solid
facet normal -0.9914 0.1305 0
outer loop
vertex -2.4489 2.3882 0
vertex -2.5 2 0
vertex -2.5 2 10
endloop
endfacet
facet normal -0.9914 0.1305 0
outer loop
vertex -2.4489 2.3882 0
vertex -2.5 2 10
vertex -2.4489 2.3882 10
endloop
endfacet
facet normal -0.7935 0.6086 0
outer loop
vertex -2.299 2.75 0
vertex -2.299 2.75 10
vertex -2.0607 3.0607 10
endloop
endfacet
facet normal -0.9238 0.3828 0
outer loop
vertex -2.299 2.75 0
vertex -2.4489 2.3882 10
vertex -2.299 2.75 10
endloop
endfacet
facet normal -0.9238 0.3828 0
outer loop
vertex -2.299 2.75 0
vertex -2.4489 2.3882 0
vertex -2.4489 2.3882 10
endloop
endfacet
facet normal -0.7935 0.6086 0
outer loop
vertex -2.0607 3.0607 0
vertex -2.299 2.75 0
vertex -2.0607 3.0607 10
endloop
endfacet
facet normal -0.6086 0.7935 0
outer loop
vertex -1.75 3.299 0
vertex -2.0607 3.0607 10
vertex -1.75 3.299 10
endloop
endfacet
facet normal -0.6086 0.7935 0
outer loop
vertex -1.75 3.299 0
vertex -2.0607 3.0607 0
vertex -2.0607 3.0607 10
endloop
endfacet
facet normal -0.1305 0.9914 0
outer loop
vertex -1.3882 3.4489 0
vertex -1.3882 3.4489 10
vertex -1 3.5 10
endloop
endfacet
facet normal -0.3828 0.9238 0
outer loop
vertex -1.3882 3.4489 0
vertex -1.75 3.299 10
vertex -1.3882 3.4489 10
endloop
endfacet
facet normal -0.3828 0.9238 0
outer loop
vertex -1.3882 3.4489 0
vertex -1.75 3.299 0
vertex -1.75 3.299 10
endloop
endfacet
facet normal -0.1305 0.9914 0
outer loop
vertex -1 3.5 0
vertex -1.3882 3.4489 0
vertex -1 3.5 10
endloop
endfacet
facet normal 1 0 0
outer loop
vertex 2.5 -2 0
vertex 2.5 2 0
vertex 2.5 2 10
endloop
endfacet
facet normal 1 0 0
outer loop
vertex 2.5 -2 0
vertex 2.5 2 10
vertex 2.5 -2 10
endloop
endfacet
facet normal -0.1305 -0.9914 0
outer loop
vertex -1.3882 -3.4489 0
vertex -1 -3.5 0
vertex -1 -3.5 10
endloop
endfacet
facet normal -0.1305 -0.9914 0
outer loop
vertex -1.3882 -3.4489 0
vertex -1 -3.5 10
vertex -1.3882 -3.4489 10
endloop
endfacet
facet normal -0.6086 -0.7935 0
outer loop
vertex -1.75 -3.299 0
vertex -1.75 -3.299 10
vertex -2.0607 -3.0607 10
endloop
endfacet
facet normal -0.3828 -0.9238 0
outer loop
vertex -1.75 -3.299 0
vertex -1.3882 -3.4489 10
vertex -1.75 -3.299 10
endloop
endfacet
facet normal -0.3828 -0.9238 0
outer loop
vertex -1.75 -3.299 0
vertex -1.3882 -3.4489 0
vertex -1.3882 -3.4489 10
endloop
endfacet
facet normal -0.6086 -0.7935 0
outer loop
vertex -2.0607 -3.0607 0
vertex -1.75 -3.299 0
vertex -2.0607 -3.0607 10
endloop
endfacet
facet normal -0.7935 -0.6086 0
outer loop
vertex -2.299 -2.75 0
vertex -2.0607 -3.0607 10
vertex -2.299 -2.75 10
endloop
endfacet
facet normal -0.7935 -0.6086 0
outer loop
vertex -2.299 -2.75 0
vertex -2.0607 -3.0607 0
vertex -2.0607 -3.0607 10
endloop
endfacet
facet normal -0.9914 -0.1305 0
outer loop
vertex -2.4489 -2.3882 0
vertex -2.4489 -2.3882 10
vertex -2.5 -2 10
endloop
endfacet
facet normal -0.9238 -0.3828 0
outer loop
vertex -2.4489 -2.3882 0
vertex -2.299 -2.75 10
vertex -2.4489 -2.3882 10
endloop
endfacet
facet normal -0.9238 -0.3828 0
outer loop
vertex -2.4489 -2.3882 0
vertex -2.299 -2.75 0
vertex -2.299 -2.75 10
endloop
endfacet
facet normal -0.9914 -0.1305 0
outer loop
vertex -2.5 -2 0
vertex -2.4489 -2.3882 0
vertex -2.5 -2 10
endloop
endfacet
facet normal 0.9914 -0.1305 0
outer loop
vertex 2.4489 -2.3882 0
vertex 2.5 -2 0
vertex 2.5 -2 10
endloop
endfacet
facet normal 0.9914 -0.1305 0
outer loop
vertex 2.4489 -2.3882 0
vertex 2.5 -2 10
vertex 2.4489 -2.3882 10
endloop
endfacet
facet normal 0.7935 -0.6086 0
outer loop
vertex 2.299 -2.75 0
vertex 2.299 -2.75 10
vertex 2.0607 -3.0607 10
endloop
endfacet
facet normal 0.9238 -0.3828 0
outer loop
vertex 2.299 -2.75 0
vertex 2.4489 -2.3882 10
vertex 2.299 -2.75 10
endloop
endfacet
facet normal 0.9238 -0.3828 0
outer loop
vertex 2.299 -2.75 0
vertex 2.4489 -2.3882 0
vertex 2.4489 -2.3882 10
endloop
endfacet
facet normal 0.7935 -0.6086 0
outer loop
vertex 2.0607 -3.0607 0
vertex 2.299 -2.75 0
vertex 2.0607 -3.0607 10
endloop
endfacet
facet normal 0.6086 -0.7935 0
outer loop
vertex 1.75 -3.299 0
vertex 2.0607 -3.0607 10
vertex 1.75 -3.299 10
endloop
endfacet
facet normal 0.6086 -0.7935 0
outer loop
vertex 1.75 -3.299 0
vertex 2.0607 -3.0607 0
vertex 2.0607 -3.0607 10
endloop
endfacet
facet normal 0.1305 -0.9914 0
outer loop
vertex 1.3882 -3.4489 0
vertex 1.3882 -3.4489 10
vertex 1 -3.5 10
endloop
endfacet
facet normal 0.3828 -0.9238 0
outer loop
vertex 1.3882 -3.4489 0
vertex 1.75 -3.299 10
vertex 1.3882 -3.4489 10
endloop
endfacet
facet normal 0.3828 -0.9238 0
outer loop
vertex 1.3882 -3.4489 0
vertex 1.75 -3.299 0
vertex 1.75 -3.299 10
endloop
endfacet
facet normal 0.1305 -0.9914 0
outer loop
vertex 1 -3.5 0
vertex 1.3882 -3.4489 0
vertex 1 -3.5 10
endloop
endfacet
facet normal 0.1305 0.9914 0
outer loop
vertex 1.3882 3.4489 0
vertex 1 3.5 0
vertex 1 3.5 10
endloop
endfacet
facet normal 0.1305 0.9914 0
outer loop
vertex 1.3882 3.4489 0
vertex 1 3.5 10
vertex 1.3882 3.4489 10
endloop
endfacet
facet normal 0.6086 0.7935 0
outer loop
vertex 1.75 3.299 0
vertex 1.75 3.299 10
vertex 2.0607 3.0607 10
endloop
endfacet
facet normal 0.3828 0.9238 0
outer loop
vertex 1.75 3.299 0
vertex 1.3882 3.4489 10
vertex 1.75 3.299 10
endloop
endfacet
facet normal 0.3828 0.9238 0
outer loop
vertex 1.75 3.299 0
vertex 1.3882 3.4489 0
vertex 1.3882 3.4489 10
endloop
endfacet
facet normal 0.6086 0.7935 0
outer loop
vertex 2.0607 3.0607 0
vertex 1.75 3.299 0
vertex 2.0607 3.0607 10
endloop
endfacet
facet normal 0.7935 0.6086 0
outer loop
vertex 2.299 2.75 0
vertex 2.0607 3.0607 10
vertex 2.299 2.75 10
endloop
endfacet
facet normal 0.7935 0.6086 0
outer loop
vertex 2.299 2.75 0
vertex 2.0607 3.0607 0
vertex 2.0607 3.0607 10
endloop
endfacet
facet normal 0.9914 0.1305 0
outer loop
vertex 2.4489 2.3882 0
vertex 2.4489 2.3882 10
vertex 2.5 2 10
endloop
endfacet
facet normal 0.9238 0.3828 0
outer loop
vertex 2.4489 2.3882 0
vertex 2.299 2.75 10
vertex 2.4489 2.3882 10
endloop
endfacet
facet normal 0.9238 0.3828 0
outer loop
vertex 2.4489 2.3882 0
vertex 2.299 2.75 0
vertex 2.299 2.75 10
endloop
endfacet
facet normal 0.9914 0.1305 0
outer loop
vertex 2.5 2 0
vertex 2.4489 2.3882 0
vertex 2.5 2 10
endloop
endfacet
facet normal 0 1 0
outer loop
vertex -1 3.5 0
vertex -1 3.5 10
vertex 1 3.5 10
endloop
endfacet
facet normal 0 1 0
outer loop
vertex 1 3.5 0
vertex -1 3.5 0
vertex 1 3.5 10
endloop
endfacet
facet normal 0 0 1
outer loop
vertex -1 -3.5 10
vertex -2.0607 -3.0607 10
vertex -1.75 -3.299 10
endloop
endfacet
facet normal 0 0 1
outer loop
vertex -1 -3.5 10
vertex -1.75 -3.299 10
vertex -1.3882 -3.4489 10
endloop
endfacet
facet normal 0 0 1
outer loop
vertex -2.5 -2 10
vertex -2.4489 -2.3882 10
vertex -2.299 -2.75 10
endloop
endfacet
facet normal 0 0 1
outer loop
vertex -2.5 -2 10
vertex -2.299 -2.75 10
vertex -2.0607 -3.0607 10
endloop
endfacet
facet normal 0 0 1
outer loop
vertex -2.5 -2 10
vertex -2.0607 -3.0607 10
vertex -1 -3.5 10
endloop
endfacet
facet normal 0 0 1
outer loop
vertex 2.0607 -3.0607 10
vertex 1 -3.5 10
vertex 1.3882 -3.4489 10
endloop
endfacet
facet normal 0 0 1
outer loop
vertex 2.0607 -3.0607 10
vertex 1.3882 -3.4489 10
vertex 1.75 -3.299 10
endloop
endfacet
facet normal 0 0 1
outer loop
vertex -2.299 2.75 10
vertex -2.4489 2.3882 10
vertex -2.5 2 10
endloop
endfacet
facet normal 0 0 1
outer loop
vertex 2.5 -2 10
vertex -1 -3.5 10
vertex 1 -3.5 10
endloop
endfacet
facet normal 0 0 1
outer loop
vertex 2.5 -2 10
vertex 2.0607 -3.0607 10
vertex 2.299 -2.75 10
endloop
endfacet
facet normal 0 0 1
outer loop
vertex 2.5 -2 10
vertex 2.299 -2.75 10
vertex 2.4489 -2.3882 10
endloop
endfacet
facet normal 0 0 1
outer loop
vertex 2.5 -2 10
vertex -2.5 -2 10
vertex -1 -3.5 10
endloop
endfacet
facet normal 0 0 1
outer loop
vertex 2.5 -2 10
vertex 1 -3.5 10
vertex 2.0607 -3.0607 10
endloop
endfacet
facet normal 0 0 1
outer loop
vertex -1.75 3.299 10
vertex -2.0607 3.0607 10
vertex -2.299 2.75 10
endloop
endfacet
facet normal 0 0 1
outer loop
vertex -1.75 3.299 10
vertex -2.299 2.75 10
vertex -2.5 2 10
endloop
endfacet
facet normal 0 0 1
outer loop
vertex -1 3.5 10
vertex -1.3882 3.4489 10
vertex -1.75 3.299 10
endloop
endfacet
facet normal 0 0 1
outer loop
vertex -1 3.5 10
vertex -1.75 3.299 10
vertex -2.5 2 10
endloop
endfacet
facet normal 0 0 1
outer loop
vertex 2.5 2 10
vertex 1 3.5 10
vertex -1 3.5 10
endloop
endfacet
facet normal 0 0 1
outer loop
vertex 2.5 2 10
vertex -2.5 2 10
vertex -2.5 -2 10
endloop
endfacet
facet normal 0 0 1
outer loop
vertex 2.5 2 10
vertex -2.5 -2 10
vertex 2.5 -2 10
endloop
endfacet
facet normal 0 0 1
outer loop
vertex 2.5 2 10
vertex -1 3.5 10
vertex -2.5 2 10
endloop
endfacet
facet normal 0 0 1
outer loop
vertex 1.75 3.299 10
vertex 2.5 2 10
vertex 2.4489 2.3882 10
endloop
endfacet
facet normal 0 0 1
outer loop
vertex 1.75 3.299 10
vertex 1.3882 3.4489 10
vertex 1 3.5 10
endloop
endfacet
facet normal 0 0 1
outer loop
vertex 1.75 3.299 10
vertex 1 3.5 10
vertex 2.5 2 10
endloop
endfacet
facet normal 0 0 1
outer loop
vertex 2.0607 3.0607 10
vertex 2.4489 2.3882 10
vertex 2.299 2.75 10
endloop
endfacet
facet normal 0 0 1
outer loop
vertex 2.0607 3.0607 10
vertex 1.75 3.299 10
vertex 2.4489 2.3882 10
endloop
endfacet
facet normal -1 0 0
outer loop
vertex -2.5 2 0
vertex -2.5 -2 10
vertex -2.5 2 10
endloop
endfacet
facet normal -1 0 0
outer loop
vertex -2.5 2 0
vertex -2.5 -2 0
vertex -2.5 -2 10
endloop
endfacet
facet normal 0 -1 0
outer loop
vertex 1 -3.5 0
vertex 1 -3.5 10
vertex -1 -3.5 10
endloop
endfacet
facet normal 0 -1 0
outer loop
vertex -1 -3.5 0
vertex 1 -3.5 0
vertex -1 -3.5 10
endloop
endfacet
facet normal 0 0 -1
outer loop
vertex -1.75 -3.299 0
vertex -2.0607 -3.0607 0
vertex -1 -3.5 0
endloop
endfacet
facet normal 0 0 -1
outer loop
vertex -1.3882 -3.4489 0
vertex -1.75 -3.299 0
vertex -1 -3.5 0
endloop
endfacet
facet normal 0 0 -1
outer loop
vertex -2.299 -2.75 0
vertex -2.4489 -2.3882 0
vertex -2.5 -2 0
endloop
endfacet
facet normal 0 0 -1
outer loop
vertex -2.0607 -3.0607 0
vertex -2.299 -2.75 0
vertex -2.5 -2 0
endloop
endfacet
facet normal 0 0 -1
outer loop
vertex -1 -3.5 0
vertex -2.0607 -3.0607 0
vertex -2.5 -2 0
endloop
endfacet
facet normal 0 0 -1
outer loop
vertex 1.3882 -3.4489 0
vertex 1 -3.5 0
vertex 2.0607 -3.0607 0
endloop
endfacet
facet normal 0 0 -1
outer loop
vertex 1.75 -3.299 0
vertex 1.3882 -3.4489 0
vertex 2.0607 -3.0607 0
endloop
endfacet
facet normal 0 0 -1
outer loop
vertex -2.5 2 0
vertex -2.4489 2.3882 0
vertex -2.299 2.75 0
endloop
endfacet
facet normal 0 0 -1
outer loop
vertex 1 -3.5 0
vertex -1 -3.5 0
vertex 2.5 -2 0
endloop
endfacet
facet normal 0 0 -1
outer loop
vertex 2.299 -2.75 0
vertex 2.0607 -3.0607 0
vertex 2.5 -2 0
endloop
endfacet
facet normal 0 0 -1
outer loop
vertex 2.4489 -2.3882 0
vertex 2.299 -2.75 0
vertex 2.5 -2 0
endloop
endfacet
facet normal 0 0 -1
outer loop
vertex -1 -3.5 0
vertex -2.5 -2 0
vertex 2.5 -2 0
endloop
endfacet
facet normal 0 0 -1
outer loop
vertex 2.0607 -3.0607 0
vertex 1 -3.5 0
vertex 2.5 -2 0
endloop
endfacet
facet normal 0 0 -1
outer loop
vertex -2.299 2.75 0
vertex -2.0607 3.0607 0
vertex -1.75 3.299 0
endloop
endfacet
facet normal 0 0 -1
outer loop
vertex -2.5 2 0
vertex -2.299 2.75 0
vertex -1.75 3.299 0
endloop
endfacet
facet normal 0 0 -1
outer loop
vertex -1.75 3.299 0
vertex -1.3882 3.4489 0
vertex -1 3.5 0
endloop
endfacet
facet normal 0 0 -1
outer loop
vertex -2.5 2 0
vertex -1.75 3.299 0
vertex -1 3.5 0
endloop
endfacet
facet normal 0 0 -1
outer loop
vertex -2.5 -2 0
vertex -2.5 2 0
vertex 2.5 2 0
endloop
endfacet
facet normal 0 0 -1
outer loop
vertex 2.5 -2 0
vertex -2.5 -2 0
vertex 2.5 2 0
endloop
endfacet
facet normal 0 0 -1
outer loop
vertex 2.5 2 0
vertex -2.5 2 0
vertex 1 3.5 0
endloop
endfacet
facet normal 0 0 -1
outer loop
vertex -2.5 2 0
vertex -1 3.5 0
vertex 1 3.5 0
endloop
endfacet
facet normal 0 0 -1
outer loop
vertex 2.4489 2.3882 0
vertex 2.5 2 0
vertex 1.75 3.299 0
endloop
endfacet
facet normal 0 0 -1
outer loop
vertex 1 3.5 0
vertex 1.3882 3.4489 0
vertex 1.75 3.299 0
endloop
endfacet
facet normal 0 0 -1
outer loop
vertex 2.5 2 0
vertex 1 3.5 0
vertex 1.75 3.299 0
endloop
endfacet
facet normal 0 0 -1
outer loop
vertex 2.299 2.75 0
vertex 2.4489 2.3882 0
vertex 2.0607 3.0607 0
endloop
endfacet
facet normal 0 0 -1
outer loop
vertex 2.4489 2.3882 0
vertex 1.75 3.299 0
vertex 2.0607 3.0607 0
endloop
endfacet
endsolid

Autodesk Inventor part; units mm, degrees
ref_plane "YZ Plane" through (0, 0, 0) normal (1, 0, 0) x (0, 1, 0)
ref_plane "XZ Plane" through (0, 0, 0) normal (0, 1, 0) x (-1, 0, 0)
ref_plane "XY Plane" through (0, 0, 0) normal (0, 0, 1) x (1, 0, 0)
sketch "Эскиз4" plane through (0, 0, 0) normal (0, 0, 1) x (1, 0, 0)
  line L0 (1, -3.5) -> (-1, -3.5)
  line L1 (-2.5, -2) -> (-2.5, 2)
  line L2 (-1, 3.5) -> (1, 3.5)
  line L3 (2.5, 2) -> (2.5, -2)
  line L4 (2.5, -3.5) -> (-2.5, 3.5) construction
  line L5 (-2.5, -3.5) -> (2.5, 3.5) construction
  arc A0 (2.5, 2) -> (1, 3.5) centre (1, 2) ccw
  arc A1 (-1, 3.5) -> (-2.5, 2) centre (-1, 2) ccw
  arc A2 (-2.5, -2) -> (-1, -3.5) centre (-1, -2) ccw
  arc A3 (1, -3.5) -> (2.5, -2) centre (1, -2) ccw
  point P0 (0, 0)
  point P1 (0, -3)
  point P2 (0, 3)
  dimension "d15" = 5
  dimension "d16" = 7
  dimension "d17" = 1.5
  dimension "d18" = 1.5
extrude "Выдавливание2" add sketch "Эскиз4" along normal blind 10
properties part number "Clemm"
